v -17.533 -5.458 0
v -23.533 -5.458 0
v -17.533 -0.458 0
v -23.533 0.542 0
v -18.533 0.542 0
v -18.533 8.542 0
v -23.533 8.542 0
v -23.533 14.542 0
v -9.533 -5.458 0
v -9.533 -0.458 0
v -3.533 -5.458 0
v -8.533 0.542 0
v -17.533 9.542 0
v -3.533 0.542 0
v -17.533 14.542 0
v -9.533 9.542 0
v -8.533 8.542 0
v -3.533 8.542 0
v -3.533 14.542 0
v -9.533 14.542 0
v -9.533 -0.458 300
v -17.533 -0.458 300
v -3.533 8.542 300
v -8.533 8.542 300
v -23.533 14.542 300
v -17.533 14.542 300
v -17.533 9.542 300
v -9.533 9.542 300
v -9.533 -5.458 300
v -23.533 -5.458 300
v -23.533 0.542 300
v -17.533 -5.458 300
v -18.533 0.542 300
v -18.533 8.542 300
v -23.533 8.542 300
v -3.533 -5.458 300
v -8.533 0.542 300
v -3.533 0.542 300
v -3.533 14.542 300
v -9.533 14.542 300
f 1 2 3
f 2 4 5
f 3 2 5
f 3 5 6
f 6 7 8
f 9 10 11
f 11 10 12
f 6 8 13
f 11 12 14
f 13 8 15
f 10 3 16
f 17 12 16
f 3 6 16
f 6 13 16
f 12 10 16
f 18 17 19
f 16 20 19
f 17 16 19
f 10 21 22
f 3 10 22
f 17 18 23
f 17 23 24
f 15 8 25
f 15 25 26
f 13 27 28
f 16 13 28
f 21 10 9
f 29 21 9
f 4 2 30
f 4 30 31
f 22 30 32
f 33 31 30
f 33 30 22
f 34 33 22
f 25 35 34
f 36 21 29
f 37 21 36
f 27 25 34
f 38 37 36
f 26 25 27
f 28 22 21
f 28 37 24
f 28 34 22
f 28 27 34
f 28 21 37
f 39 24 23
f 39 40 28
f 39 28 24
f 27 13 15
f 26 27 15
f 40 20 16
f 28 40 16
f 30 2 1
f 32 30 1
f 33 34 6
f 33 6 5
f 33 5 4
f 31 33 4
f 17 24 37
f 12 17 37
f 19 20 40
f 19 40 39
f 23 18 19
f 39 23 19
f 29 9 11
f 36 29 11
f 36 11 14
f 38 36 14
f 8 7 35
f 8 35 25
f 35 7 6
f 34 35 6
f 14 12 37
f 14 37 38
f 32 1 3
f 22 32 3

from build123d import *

# Parameters (mm, degrees)
CROQUIS1_W              = 20
CROQUIS1_H              = 20
SALIENTE_EXTRUIR1_DEPTH = 300
CORTAR_EXTRUIR1_DEPTH   = 320


with BuildPart() as part:
    # Croquis1 → Saliente-Extruir1 (new body)
    with BuildSketch(Plane.XY):
        with Locations((-13.532555049, 4.541666667)):
            Rectangle(CROQUIS1_W, CROQUIS1_H)
    extrude(amount=SALIENTE_EXTRUIR1_DEPTH)

    # Croquis2 → Cortar-Extruir1 (cut)
    with BuildSketch(Plane.XY.offset(300)):
        Polygon((-13.532555049, 9.541666667), (-17.532555049, 9.541666667), (-17.532555049, 14.541666667), (-9.532555049, 14.541666667), (-9.532555049, 9.541666667), align=None)
        Polygon((-9.532555049, -0.458333333), (-9.532555049, -5.458333333), (-17.532555049, -5.458333333), (-17.532555049, -0.458333333), (-13.532555049, -0.458333333), align=None)
        Polygon((-23.532555049, 4.541666667), (-23.532555049, 8.541666667), (-18.532555049, 8.541666667), (-18.532555049, 0.541666667), (-23.532555049, 0.541666667), align=None)
        Polygon((-8.532555049, 8.541666667), (-8.532555049, 0.541666667), (-3.532555049, 0.541666667), (-3.532555049, 4.541666667), (-3.532555049, 8.541666667), align=None)
    extrude(amount=-CORTAR_EXTRUIR1_DEPTH, mode=Mode.SUBTRACT)


solid = part.part
